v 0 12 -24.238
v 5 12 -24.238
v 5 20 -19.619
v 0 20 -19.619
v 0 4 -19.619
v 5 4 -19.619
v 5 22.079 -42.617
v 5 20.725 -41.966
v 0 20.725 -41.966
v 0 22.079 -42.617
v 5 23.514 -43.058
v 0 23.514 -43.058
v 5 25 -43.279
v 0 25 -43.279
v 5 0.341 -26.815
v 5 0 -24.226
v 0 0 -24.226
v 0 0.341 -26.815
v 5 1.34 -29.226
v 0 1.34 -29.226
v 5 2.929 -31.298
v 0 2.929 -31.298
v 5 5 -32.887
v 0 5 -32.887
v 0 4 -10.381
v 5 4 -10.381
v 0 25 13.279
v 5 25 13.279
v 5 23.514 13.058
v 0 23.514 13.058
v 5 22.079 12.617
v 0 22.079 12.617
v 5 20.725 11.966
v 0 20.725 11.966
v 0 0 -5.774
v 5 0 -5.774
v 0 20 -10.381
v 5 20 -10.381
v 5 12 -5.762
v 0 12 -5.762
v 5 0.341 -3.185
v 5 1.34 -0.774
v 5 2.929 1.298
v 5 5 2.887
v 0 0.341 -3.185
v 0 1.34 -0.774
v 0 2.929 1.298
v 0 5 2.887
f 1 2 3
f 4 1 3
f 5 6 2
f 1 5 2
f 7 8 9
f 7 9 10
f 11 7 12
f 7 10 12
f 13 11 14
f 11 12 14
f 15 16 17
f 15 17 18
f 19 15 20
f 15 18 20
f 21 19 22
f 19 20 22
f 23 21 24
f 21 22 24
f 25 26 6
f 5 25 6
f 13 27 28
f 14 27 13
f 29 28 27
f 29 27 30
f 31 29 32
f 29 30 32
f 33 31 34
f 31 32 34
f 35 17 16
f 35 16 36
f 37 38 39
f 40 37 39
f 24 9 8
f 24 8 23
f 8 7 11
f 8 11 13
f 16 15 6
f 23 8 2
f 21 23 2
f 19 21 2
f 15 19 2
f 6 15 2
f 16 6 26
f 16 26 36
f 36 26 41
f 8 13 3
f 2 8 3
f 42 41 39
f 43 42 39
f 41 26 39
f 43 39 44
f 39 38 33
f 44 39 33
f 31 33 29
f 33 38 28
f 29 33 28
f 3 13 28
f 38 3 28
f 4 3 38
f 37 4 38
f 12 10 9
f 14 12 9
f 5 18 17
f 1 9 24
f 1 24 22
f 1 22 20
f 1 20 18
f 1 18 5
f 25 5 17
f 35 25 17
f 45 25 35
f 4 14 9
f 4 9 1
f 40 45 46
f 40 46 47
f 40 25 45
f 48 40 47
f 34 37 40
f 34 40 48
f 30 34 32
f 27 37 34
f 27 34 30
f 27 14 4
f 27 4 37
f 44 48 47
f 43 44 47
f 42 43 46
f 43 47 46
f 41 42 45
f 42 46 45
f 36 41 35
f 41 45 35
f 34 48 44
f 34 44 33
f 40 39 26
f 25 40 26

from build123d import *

# Parameters (mm, degrees)
EXTRUDE_1_DEPTH     = 5
FILLET_1_R          = 10
CUT_EXTRUDE_1_DEPTH = 10


with BuildPart() as part:
    # 스케치1 → 보스-돌출1 (new body)
    with BuildSketch(Plane(origin=(0, 0, 0), x_dir=(0, 0, -1), z_dir=(1, 0, 0))):
        Polygon((0, 0), (-13.279056191, 23), (-13.279056191, 25), (43.279056191, 25), (43.279056191, 23), (30, 0), align=None)
    extrude(amount=EXTRUDE_1_DEPTH)

    # 필렛1
    # the kernel refuses this fillet: 10 mm, written as the material it takes off along each edge
    with BuildSketch(Plane(origin=(-6.56712034, 23, -43.279056191), x_dir=(0, 1, 0), z_dir=(1, 0, 0))) as fillet_1_piece_1:
        with BuildLine():
            CenterArc((2.725082782, 9.973678106), FILLET_1_R, 240, 25.841932763)
            Line((-2.274917218, 1.313424068), (-2.374917218, 1.140218987))
            Line((-2.374917218, 1.140218987), (-0.1, -0.173205081))
            Line((-0.1, -0.173205081), (0, -0.2))
            ThreePointArc((0, -0.2), (1, -0.2), (1.985498344, -0.199473562))
            Line((1.985498344, -0.199473562), (2, 0))
        make_face()
    extrude(amount=18.13424068, mode=Mode.SUBTRACT)
    with BuildSketch(Plane(origin=(-14.43375673, 0, -30), x_dir=(0, 0.8660254037844399, -0.499999999999998), z_dir=(1, 0, 0))) as fillet_1_piece_2:
        with BuildLine():
            CenterArc((FILLET_1_R * 0.57735026919, FILLET_1_R), FILLET_1_R, 210, 60)
            Line((-FILLET_1_R * 0.288675134595, FILLET_1_R * 0.5), (-FILLET_1_R * 0.305995642671, FILLET_1_R * 0.49))
            Line((-FILLET_1_R * 0.305995642671, FILLET_1_R * 0.49), (-FILLET_1_R * 0.0115470053838, -FILLET_1_R * 0.02))
            Line((-FILLET_1_R * 0.0115470053838, -FILLET_1_R * 0.02), (FILLET_1_R * 0.57735026919, -FILLET_1_R * 0.02))
            Line((FILLET_1_R * 0.57735026919, -FILLET_1_R * 0.02), (FILLET_1_R * 0.57735026919, 0))
        make_face()
    extrude(amount=33.867513459, mode=Mode.SUBTRACT)
    with BuildSketch(Plane(origin=(-14.43375673, 0, 0), x_dir=(0, 0.8660254037844397, 0.49999999999999833), z_dir=(1, 0, 0))) as fillet_1_piece_3:
        with BuildLine():
            CenterArc((FILLET_1_R * 0.57735026919, -FILLET_1_R), FILLET_1_R, 90, 60)
            Line((-FILLET_1_R * 0.288675134595, -FILLET_1_R * 0.5), (-FILLET_1_R * 0.305995642671, -FILLET_1_R * 0.49))
            Line((-FILLET_1_R * 0.305995642671, -FILLET_1_R * 0.49), (-FILLET_1_R * 0.0115470053838, FILLET_1_R * 0.02))
            Line((-FILLET_1_R * 0.0115470053838, FILLET_1_R * 0.02), (FILLET_1_R * 0.57735026919, FILLET_1_R * 0.02))
            Line((FILLET_1_R * 0.57735026919, FILLET_1_R * 0.02), (FILLET_1_R * 0.57735026919, 0))
        make_face()
    extrude(amount=33.867513459, mode=Mode.SUBTRACT)
    with BuildSketch(Plane(origin=(-6.56712034, 23, 13.279056191), x_dir=(0, -0.8660254037844397, -0.4999999999999979), z_dir=(1, 0, 0))) as fillet_1_piece_4:
        with BuildLine():
            CenterArc((2.626848136, 10), FILLET_1_R, 244.158067237, 25.841932763)
            Line((-1.732050808, 1), (-1.819228786, 0.82))
            ThreePointArc((-1.819228786, 0.82), (-0.966025404, 0.326794919), (-0.1, -0.173205081))
            Line((-0.1, -0.173205081), (0, -0.2))
            Line((0, -0.2), (2.626848136, -0.2))
            Line((2.626848136, -0.2), (2.626848136, 0))
        make_face()
    extrude(amount=18.13424068, mode=Mode.SUBTRACT)

    # 스케치2 → 컷-돌출1 (cut)
    with BuildSketch(Plane(origin=(5, 0, 0), x_dir=(0, 0, -1), z_dir=(1, 0, 0))):
        Polygon((19.618802154, 20), (10.381197846, 20), (5.762395693, 12), (10.381197846, 4), (19.618802154, 4), (24.237604307, 12), align=None)
    extrude(amount=-CUT_EXTRUDE_1_DEPTH, mode=Mode.SUBTRACT)


solid = part.part
